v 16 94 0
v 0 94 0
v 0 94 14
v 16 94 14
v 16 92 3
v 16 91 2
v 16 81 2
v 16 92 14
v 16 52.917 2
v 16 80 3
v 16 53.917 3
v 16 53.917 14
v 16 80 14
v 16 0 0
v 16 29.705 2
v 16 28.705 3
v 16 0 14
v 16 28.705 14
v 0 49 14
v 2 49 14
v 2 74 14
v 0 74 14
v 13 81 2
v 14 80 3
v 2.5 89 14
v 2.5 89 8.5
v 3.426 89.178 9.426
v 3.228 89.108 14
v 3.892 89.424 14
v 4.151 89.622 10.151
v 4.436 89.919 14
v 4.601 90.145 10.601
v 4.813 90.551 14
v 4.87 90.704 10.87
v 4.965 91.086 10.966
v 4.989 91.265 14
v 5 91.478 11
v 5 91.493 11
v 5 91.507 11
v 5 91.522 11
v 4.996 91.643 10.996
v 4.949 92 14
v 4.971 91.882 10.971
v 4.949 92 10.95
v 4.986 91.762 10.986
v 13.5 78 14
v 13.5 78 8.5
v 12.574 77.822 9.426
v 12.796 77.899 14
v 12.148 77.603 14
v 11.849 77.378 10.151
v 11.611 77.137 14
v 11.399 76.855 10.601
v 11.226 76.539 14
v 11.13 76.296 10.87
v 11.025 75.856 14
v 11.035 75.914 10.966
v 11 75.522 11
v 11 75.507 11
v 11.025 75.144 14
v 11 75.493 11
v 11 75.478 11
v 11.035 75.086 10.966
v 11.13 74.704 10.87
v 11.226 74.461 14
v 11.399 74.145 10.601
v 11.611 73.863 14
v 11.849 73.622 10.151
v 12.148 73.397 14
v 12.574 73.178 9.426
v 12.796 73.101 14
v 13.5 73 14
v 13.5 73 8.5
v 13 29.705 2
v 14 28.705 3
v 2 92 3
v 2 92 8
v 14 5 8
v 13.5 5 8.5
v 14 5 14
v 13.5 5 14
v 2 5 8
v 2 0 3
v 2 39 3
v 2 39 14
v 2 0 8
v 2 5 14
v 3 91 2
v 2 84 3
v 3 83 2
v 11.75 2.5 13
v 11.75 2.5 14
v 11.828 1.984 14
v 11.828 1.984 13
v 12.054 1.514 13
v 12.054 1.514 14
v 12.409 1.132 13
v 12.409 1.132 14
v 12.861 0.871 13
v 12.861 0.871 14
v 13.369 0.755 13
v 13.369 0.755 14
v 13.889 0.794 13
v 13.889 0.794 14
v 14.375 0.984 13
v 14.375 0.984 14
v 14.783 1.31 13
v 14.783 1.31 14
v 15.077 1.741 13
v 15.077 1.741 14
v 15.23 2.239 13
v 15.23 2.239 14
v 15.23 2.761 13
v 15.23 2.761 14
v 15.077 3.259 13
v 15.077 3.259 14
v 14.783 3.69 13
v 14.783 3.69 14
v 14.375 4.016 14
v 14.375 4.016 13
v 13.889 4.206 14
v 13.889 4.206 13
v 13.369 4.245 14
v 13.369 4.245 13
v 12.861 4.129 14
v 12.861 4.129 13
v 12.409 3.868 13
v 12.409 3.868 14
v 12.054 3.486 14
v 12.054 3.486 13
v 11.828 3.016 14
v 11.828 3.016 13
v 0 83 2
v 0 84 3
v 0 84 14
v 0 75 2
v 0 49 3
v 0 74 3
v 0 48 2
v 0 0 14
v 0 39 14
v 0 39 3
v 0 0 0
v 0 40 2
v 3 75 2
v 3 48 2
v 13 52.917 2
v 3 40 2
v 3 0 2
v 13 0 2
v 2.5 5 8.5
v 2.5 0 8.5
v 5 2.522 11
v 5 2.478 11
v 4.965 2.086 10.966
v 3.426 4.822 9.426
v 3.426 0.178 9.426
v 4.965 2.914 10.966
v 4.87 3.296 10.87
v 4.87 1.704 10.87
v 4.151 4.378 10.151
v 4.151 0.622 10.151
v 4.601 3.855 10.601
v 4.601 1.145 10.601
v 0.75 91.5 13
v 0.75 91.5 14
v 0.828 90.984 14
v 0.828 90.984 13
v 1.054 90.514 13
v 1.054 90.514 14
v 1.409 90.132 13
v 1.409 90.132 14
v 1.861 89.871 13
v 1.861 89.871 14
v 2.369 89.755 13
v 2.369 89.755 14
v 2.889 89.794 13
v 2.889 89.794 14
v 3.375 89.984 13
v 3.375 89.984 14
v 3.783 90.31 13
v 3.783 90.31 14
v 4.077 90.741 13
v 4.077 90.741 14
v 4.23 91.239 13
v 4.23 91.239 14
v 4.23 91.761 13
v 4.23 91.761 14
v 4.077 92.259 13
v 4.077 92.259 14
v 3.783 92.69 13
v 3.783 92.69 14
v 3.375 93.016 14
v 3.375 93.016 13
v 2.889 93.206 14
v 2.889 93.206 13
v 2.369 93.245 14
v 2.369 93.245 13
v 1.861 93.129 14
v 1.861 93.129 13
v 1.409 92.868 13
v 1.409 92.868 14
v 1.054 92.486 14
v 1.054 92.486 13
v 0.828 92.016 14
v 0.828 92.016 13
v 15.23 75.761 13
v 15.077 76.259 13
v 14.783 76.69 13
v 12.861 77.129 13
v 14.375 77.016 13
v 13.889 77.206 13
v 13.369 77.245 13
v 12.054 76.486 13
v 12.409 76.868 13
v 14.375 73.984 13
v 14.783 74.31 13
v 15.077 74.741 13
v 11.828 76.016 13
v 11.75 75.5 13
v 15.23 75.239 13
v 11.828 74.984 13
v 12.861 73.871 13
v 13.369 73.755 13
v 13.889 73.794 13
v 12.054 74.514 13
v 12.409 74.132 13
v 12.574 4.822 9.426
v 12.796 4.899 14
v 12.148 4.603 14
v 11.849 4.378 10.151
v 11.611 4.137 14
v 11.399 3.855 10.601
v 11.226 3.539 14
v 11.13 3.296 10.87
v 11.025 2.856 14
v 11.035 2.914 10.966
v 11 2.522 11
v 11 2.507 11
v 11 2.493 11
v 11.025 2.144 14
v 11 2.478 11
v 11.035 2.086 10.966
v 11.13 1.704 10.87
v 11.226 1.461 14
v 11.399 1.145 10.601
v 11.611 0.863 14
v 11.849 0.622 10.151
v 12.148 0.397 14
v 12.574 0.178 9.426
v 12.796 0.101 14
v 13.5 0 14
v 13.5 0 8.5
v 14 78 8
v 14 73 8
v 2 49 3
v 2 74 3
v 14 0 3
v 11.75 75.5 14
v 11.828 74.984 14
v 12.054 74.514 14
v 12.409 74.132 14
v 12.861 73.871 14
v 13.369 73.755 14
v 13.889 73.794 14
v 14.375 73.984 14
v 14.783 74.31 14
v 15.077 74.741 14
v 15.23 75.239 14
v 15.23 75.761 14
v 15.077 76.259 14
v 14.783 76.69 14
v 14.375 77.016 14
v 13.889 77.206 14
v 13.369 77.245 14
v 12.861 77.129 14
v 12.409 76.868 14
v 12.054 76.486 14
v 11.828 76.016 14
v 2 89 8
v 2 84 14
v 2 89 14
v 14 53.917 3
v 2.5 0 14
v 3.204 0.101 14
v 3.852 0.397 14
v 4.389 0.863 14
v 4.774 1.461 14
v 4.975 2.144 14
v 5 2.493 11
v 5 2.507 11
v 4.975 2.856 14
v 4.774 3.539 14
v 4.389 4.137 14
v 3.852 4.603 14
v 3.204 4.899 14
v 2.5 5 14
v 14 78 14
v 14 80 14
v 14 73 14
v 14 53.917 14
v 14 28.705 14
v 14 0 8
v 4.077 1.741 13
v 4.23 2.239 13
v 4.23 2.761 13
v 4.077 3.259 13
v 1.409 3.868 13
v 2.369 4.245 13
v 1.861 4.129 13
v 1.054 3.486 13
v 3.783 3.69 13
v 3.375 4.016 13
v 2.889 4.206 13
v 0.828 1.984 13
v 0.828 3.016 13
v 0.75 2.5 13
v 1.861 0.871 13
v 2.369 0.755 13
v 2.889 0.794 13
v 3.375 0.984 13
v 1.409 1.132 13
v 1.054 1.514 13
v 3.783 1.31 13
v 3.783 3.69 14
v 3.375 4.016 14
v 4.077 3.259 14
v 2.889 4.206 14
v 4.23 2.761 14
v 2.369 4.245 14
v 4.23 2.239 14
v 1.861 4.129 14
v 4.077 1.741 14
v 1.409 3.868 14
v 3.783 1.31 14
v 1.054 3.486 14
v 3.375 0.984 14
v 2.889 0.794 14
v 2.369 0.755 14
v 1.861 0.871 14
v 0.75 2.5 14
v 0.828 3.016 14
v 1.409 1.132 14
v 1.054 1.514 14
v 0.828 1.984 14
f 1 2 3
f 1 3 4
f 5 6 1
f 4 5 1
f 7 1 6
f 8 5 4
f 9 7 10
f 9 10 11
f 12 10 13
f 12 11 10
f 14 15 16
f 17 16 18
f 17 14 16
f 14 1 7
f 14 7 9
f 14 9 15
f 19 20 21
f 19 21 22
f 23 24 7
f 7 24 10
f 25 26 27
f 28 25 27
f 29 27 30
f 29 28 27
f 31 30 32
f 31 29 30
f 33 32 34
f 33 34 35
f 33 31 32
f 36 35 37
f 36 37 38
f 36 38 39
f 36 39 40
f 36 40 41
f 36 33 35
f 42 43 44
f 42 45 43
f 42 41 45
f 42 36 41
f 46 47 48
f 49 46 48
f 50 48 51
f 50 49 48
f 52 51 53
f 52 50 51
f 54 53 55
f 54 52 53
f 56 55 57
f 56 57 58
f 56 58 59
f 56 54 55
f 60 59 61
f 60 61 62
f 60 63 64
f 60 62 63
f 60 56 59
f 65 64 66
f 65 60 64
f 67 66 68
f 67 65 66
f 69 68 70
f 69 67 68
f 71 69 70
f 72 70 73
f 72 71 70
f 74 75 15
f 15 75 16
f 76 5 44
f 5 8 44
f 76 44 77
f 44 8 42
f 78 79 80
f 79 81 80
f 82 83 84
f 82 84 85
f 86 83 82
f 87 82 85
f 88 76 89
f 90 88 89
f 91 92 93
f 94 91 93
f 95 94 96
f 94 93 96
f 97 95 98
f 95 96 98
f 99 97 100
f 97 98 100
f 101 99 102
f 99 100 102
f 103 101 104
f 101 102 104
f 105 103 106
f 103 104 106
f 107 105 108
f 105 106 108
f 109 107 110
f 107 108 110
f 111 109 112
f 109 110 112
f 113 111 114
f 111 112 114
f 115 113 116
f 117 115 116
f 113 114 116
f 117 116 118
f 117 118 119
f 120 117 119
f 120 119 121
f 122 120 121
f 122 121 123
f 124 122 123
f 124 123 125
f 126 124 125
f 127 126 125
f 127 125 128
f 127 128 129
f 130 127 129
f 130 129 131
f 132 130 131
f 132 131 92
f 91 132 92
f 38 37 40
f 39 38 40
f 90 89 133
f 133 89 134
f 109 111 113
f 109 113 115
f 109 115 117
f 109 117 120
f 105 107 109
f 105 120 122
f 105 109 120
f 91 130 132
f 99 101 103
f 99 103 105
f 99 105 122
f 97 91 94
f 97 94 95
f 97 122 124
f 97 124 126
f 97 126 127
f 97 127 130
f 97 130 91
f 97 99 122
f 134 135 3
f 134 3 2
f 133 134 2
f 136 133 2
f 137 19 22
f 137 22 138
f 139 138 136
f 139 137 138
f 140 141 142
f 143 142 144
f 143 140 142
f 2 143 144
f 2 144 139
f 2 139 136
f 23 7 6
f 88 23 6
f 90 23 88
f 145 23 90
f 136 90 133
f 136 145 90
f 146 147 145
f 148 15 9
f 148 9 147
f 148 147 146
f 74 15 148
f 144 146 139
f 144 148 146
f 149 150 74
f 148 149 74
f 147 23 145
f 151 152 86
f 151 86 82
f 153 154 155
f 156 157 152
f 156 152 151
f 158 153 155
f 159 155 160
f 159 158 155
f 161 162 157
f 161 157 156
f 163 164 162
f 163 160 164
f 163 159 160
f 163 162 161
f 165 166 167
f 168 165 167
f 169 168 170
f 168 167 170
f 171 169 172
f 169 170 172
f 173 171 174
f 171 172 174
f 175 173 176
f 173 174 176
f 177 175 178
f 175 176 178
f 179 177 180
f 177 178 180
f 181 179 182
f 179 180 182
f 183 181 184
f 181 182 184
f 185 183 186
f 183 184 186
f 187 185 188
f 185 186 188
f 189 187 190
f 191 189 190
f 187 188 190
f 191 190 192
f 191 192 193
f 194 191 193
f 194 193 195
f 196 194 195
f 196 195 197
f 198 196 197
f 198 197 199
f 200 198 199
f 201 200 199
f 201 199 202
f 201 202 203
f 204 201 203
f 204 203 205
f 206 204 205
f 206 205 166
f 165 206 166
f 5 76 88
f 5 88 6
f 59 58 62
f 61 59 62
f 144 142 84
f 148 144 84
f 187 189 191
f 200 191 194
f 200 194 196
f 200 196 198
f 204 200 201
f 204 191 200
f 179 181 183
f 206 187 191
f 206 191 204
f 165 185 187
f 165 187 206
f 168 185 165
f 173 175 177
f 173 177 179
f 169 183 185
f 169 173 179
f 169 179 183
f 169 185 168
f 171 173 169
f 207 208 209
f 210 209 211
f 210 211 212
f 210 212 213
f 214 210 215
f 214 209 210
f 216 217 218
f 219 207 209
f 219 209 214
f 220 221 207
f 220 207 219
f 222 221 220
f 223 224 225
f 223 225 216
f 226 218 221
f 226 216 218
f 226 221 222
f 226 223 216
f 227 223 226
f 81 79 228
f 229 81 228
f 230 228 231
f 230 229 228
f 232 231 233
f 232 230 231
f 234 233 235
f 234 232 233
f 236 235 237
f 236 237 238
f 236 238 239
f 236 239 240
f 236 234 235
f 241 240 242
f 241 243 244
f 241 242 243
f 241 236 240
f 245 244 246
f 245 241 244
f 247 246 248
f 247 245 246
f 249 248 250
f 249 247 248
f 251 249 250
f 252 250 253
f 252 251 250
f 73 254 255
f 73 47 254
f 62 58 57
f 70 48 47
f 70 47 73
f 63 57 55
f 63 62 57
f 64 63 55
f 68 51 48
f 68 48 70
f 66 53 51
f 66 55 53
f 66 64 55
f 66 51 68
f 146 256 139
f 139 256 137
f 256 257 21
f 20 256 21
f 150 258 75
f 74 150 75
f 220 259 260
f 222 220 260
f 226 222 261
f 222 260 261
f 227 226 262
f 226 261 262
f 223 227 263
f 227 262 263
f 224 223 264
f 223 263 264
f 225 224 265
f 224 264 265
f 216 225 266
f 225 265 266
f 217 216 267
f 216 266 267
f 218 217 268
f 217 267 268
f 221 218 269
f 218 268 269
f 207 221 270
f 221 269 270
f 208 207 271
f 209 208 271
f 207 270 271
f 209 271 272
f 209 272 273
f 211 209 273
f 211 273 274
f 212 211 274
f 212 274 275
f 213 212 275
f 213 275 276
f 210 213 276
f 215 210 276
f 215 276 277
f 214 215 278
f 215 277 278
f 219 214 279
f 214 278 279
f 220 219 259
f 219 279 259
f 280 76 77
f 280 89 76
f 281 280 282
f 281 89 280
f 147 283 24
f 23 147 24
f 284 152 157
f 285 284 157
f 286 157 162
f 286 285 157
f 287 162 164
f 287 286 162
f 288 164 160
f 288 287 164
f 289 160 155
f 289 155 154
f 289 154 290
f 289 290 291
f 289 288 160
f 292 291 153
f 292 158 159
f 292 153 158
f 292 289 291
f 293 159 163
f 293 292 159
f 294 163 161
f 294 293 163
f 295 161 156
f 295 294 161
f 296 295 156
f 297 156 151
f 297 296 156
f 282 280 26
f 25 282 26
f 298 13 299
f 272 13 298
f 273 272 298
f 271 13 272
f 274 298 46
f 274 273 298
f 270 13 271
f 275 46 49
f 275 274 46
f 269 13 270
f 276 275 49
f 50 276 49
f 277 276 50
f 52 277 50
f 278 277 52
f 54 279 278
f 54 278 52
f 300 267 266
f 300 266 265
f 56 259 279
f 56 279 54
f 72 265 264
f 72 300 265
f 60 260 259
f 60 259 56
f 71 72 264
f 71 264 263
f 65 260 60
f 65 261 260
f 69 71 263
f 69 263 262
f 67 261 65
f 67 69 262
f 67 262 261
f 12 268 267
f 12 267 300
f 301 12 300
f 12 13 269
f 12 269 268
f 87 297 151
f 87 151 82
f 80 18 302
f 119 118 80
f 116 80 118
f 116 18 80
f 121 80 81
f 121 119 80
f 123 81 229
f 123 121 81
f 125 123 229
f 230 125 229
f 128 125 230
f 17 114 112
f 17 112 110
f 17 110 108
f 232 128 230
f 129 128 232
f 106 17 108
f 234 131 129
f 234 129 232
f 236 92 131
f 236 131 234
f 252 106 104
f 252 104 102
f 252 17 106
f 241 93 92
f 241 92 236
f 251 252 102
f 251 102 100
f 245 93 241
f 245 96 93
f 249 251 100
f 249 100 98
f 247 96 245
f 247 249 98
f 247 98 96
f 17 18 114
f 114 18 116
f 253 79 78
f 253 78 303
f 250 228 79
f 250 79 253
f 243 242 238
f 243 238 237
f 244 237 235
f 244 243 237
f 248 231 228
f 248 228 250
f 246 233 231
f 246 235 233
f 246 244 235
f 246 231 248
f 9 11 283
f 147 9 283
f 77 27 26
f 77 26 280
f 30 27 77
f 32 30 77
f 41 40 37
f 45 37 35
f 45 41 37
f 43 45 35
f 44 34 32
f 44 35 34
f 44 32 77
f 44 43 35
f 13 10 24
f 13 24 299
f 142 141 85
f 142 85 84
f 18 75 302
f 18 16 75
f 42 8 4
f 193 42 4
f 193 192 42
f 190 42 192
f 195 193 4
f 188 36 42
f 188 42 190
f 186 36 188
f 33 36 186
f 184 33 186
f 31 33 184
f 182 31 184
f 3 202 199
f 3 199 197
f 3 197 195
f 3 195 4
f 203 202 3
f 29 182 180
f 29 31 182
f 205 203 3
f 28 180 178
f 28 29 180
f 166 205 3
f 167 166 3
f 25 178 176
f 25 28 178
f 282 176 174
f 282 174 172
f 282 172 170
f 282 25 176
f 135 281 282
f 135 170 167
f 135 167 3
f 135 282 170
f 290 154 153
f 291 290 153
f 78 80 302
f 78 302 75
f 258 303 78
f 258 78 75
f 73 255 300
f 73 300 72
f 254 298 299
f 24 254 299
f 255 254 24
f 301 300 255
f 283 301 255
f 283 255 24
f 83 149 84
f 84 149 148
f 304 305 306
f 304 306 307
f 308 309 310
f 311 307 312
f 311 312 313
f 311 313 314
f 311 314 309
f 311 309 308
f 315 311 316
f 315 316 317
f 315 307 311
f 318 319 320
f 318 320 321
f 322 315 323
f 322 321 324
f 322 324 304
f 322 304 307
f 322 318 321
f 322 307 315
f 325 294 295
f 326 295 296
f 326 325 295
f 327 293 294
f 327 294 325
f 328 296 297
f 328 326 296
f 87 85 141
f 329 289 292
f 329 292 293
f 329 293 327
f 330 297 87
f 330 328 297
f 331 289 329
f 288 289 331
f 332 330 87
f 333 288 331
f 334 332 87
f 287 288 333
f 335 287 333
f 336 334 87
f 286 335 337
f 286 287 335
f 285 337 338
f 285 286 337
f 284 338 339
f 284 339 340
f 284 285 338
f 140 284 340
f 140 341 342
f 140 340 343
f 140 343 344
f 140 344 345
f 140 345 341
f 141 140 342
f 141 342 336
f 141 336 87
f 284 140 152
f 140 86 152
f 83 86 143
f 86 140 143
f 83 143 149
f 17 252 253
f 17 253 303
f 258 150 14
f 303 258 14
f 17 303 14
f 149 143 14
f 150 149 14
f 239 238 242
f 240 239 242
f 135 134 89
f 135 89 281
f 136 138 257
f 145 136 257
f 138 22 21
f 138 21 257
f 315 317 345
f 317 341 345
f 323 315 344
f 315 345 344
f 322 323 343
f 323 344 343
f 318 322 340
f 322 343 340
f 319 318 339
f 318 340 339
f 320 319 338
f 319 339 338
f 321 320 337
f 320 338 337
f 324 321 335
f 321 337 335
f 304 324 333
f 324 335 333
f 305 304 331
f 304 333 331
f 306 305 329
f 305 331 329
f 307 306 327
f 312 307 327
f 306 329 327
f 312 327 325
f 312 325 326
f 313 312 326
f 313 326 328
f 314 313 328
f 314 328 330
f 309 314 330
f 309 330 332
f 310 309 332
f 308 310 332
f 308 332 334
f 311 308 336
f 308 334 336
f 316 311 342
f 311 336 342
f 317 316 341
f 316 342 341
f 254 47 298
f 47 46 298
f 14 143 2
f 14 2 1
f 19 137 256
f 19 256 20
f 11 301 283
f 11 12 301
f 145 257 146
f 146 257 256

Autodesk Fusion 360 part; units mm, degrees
sketch "3D-printed conduit outline" plane through (0, 0, 0) normal (0, 1, 0) x (1, 0, 0)
  line L0 (0, 0) -> (16, 0)
  line L1 (16, 0) -> (16, -14)
  line L2 (16, -14) -> (0, -14)
  line L3 (0, -14) -> (0, 0)
  line L4 (2, -14) -> (14, -14)
  line L5 (14, -14) -> (14, -2)
  line L6 (14, -2) -> (2, -2)
  line L7 (2, -2) -> (2, -14)
  dimension "d8" = 14
  dimension "d9" = 16
  dimension "d10" = 2
  dimension "d11" = 2
  dimension "d12" = 2
extrude "Extrude1" add sketch "3D-printed conduit outline" along normal blind 94 contours L0 L1 L2 L3 L5 L6 L7
sketch "Magnet holders" plane through (0, 0, 14) normal (0, 0, 1) x (-1, 0, 0)
  line L0 (0, 0) -> (-2, 0)
  line L1 (-2, 0) -> (-2, -94)
  line L2 (-2, -94) -> (0, -94)
  line L3 (0, -94) -> (0, 0)
  line L4 (-14, 0) -> (-16, 0)
  line L5 (-16, 0) -> (-16, -94)
  line L6 (-16, -94) -> (-14, -94)
  line L7 (-14, -94) -> (-14, 0)
  circle A0 centre (-2.5, -2.5) radius 2.5
  circle A1 centre (-2.5, -2.5) radius 1.75
  line L8 (-14, 0) -> (-2, 0)
  line L9 (0, 0) -> (-2.5, 0)
  line L10 (-2.5, 0) -> (-2.5, -5)
  line L11 (-2.5, -5) -> (0, -5)
  line L12 (0, -5) -> (0, 0)
  circle A2 centre (-13.5, -2.5) radius 2.5
  circle A3 centre (-13.5, -2.5) radius 1.75
  line L13 (-16, 0) -> (-13.5, 0)
  line L14 (-13.5, 0) -> (-13.5, -5)
  line L15 (-13.5, -5) -> (-16, -5)
  line L16 (-16, -5) -> (-16, 0)
  circle A4 centre (-2.5, -91.5) radius 1.75
  circle A5 centre (-2.5, -91.5) radius 2.5
  line L17 (-2.5, -89) -> (-2.5, -94)
  line L18 (-2.5, -94) -> (0, -94)
  line L19 (0, -94) -> (0, -89)
  line L20 (0, -89) -> (-2.5, -89)
  circle A6 centre (-13.5, -75.5) radius 2.5
  circle A7 centre (-13.5, -75.5) radius 1.75
  line L21 (-13.5, -73) -> (-13.5, -78)
  line L22 (-13.5, -78) -> (-16, -78)
  line L23 (-16, -78) -> (-16, -73)
  line L24 (-16, -73) -> (-13.5, -73)
  dimension "d15" = 5
  dimension "d16" = 3.5
  dimension "d17" = 5
  dimension "d18" = 3.5
  dimension "d21" = 0
  dimension "d22" = -89
  dimension "d42" = 0
  dimension "d43" = -73
sketch "End wall" plane through (0, 94, 0) normal (0, 1, 0) x (-1, 0, 0)
  line L0 (-2, 2) -> (-14, 2)
  line L1 (-14, 2) -> (-14, 14)
  line L2 (-14, 14) -> (-16, 14)
  line L3 (-16, 14) -> (-16, 0)
  line L4 (-16, 0) -> (0, 0)
  line L5 (0, 0) -> (0, 14)
  line L6 (0, 14) -> (-2, 14)
  line L7 (-2, 14) -> (-2, 2)
  line L8 (-16, 0) -> (0, 0)
  line L9 (0, 0) -> (0, 14)
  line L10 (0, 14) -> (-16, 14)
  line L11 (-16, 14) -> (-16, 0)
extrude "Extrude8" add sketch "End wall" against normal blind 2
extrude "Extrude2" add sketch "Magnet holders" against normal blind 3 contours A2 A3 L14 | L7 A2 A3 L14 | L7 L8 A2 L13 | L1 A0 L8 L9 | L1 A0 A1 L10 | A0 A1 L10 | L1 A0 A1 L10 | L1 A0 L11 | L1 A1 L10 | A1 L10 | L7 A3 L14 | A3 L14 | L1 A5 L20 | L7 A2 L15 | L7 A2 A3 L14 | L1 A4 A5 L17 | L1 A4 A5 L17 | L1 A5 L18 | A4 A5 L17 | L1 A4 L17 | A4 L17 | L7 A6 L24 | L7 A6 A7 L21 | A6 A7 L21 | L7 A7 L21 | A7 L21 | L7 A6 L22 | L7 A6 A7 L21
extrude "Extrude4" cut sketch "Magnet holders" against normal blind 1 contours L1 A1 | L1 A1 L10 | A1 L10 | L7 A3 L14 | A3 L14 | L7 A3 | L1 A4 | L1 A4 L17 | A4 L17 | L7 A7 L21 | L7 A7 | A7 L21
chamfer "Chamfer2" distance 2.9999 angle 45 4 edges at (2, 2.5, 11) (2, 90.5, 11) (14, 2.5, 11) (14, 75.5, 11)
sketch "LED outlets" plane through (0, 0, 0) normal (-1, 0, 0) x (0, -1, 0)
  line L0 (0, 0) -> (0, 14)
  line L1 (0, 14) -> (-94, 14)
  line L2 (-94, 14) -> (-94, 0)
  line L3 (-94, 0) -> (0, 0)
  line L4 (-49, 14) -> (-39, 14)
  line L5 (-39, 14) -> (-39, 2)
  line L6 (-39, 2) -> (-49, 2)
  line L7 (-49, 2) -> (-49, 14)
  line L8 (-84, 14) -> (-74, 14)
  line L9 (-74, 14) -> (-74, 2)
  line L10 (-74, 2) -> (-84, 2)
  line L11 (-84, 2) -> (-84, 14)
  dimension "d31" = 10
  dimension "d32" = 10
  dimension "d33" = 25
  dimension "d34" = 2
  dimension "d35" = 39
extrude "Extrude5" cut sketch "LED outlets" against normal blind 2 contours L1 L4 L5 L6 L7 | L1 L8 L9 L10 L11
sketch "Arcade butons outlet" plane through (16, 0, 0) normal (1, 0, 0) x (0, 1, 0)
  line L0 (94, 14) -> (0, 14)
  line L1 (0, 14) -> (0, 0)
  line L2 (0, 0) -> (94, 0)
  line L3 (94, 0) -> (94, 14)
  line L4 (80, 14) -> (92, 14)
  line L5 (92, 14) -> (92, 2)
  line L6 (92, 2) -> (80, 2)
  line L7 (80, 2) -> (80, 14)
  dimension "d48" = 2
  dimension "d49" = 2
  dimension "d50" = 12
extrude "Extrude9" cut sketch "Arcade butons outlet" against normal blind 2 contours L0 L4 L5 L6 L7
sketch "Colour sensor outlet" plane through (16, 0, 0) normal (1, 0, 0) x (0, 1, 0)
  line L0 (80, 2) -> (80, 14)
  line L1 (80, 14) -> (0, 14)
  line L2 (0, 14) -> (0, 0)
  line L3 (0, 0) -> (94, 0)
  line L4 (94, 0) -> (94, 14)
  line L5 (94, 14) -> (92, 14)
  line L6 (92, 14) -> (92, 2)
  line L7 (92, 2) -> (80, 2)
  line L8 (28.705, 14) -> (53.917, 14)
  line L9 (53.917, 14) -> (53.917, 2)
  line L10 (53.917, 2) -> (28.705, 2)
  line L11 (28.705, 2) -> (28.705, 14)
  dimension "d54" = 2
  dimension "d55" = 25.212
  dimension "d58" = 28.705
extrude "Extrude10" cut sketch "Colour sensor outlet" against normal blind 2 contours L1 L8 L9 L10 L11
chamfer "Chamfer4" distance 1 angle 45 13 edges at (2, 19.5, 2) (1, 39, 2) (1, 49, 2) (2, 61.5, 2) (1, 74, 2) (1, 84, 2) (2, 88, 2) (9, 92, 2) (15, 80, 2) (14, 66.9585, 2) (15, 53.917, 2) (15, 28.705, 2) (14, 14.3525, 2)
equation "conduit_length = 94 mm"
equation "conduit_width = 16 mm"
equation "conduit_height = 16 mm"
equation "conduit_wall_thickness = 2 mm"
equation "magnet_diameter = 3 mm"
equation "magnet_height = 1 mm"
equation "d8 = conduit_height - conduit_wall_thickness"
equation "d9 = conduit_width"
equation "d10 = conduit_wall_thickness"
equation "d11 = conduit_wall_thickness"
equation "d12 = conduit_wall_thickness"
equation "d13 = conduit_length"
equation "d15 = magnet_diameter + 2 mm"
equation "d16 = magnet_diameter + 0.5 mm"
equation "d17 = magnet_diameter + 2 mm"
equation "d18 = magnet_diameter + 0.5 mm"
equation "d22 = -conduit_length + ( magnet_diameter + 2 mm )"
equation "d23 = -( magnet_height + 2 mm )"
equation "d34 = conduit_wall_thickness"
equation "d43 = -conduit_length + ( magnet_diameter + 2 mm ) + ( conduit_width )"
equation "d48 = conduit_wall_thickness"
equation "d49 = conduit_wall_thickness"
equation "d50 = conduit_width - 2 * conduit_wall_thickness"
equation "d54 = conduit_wall_thickness"
